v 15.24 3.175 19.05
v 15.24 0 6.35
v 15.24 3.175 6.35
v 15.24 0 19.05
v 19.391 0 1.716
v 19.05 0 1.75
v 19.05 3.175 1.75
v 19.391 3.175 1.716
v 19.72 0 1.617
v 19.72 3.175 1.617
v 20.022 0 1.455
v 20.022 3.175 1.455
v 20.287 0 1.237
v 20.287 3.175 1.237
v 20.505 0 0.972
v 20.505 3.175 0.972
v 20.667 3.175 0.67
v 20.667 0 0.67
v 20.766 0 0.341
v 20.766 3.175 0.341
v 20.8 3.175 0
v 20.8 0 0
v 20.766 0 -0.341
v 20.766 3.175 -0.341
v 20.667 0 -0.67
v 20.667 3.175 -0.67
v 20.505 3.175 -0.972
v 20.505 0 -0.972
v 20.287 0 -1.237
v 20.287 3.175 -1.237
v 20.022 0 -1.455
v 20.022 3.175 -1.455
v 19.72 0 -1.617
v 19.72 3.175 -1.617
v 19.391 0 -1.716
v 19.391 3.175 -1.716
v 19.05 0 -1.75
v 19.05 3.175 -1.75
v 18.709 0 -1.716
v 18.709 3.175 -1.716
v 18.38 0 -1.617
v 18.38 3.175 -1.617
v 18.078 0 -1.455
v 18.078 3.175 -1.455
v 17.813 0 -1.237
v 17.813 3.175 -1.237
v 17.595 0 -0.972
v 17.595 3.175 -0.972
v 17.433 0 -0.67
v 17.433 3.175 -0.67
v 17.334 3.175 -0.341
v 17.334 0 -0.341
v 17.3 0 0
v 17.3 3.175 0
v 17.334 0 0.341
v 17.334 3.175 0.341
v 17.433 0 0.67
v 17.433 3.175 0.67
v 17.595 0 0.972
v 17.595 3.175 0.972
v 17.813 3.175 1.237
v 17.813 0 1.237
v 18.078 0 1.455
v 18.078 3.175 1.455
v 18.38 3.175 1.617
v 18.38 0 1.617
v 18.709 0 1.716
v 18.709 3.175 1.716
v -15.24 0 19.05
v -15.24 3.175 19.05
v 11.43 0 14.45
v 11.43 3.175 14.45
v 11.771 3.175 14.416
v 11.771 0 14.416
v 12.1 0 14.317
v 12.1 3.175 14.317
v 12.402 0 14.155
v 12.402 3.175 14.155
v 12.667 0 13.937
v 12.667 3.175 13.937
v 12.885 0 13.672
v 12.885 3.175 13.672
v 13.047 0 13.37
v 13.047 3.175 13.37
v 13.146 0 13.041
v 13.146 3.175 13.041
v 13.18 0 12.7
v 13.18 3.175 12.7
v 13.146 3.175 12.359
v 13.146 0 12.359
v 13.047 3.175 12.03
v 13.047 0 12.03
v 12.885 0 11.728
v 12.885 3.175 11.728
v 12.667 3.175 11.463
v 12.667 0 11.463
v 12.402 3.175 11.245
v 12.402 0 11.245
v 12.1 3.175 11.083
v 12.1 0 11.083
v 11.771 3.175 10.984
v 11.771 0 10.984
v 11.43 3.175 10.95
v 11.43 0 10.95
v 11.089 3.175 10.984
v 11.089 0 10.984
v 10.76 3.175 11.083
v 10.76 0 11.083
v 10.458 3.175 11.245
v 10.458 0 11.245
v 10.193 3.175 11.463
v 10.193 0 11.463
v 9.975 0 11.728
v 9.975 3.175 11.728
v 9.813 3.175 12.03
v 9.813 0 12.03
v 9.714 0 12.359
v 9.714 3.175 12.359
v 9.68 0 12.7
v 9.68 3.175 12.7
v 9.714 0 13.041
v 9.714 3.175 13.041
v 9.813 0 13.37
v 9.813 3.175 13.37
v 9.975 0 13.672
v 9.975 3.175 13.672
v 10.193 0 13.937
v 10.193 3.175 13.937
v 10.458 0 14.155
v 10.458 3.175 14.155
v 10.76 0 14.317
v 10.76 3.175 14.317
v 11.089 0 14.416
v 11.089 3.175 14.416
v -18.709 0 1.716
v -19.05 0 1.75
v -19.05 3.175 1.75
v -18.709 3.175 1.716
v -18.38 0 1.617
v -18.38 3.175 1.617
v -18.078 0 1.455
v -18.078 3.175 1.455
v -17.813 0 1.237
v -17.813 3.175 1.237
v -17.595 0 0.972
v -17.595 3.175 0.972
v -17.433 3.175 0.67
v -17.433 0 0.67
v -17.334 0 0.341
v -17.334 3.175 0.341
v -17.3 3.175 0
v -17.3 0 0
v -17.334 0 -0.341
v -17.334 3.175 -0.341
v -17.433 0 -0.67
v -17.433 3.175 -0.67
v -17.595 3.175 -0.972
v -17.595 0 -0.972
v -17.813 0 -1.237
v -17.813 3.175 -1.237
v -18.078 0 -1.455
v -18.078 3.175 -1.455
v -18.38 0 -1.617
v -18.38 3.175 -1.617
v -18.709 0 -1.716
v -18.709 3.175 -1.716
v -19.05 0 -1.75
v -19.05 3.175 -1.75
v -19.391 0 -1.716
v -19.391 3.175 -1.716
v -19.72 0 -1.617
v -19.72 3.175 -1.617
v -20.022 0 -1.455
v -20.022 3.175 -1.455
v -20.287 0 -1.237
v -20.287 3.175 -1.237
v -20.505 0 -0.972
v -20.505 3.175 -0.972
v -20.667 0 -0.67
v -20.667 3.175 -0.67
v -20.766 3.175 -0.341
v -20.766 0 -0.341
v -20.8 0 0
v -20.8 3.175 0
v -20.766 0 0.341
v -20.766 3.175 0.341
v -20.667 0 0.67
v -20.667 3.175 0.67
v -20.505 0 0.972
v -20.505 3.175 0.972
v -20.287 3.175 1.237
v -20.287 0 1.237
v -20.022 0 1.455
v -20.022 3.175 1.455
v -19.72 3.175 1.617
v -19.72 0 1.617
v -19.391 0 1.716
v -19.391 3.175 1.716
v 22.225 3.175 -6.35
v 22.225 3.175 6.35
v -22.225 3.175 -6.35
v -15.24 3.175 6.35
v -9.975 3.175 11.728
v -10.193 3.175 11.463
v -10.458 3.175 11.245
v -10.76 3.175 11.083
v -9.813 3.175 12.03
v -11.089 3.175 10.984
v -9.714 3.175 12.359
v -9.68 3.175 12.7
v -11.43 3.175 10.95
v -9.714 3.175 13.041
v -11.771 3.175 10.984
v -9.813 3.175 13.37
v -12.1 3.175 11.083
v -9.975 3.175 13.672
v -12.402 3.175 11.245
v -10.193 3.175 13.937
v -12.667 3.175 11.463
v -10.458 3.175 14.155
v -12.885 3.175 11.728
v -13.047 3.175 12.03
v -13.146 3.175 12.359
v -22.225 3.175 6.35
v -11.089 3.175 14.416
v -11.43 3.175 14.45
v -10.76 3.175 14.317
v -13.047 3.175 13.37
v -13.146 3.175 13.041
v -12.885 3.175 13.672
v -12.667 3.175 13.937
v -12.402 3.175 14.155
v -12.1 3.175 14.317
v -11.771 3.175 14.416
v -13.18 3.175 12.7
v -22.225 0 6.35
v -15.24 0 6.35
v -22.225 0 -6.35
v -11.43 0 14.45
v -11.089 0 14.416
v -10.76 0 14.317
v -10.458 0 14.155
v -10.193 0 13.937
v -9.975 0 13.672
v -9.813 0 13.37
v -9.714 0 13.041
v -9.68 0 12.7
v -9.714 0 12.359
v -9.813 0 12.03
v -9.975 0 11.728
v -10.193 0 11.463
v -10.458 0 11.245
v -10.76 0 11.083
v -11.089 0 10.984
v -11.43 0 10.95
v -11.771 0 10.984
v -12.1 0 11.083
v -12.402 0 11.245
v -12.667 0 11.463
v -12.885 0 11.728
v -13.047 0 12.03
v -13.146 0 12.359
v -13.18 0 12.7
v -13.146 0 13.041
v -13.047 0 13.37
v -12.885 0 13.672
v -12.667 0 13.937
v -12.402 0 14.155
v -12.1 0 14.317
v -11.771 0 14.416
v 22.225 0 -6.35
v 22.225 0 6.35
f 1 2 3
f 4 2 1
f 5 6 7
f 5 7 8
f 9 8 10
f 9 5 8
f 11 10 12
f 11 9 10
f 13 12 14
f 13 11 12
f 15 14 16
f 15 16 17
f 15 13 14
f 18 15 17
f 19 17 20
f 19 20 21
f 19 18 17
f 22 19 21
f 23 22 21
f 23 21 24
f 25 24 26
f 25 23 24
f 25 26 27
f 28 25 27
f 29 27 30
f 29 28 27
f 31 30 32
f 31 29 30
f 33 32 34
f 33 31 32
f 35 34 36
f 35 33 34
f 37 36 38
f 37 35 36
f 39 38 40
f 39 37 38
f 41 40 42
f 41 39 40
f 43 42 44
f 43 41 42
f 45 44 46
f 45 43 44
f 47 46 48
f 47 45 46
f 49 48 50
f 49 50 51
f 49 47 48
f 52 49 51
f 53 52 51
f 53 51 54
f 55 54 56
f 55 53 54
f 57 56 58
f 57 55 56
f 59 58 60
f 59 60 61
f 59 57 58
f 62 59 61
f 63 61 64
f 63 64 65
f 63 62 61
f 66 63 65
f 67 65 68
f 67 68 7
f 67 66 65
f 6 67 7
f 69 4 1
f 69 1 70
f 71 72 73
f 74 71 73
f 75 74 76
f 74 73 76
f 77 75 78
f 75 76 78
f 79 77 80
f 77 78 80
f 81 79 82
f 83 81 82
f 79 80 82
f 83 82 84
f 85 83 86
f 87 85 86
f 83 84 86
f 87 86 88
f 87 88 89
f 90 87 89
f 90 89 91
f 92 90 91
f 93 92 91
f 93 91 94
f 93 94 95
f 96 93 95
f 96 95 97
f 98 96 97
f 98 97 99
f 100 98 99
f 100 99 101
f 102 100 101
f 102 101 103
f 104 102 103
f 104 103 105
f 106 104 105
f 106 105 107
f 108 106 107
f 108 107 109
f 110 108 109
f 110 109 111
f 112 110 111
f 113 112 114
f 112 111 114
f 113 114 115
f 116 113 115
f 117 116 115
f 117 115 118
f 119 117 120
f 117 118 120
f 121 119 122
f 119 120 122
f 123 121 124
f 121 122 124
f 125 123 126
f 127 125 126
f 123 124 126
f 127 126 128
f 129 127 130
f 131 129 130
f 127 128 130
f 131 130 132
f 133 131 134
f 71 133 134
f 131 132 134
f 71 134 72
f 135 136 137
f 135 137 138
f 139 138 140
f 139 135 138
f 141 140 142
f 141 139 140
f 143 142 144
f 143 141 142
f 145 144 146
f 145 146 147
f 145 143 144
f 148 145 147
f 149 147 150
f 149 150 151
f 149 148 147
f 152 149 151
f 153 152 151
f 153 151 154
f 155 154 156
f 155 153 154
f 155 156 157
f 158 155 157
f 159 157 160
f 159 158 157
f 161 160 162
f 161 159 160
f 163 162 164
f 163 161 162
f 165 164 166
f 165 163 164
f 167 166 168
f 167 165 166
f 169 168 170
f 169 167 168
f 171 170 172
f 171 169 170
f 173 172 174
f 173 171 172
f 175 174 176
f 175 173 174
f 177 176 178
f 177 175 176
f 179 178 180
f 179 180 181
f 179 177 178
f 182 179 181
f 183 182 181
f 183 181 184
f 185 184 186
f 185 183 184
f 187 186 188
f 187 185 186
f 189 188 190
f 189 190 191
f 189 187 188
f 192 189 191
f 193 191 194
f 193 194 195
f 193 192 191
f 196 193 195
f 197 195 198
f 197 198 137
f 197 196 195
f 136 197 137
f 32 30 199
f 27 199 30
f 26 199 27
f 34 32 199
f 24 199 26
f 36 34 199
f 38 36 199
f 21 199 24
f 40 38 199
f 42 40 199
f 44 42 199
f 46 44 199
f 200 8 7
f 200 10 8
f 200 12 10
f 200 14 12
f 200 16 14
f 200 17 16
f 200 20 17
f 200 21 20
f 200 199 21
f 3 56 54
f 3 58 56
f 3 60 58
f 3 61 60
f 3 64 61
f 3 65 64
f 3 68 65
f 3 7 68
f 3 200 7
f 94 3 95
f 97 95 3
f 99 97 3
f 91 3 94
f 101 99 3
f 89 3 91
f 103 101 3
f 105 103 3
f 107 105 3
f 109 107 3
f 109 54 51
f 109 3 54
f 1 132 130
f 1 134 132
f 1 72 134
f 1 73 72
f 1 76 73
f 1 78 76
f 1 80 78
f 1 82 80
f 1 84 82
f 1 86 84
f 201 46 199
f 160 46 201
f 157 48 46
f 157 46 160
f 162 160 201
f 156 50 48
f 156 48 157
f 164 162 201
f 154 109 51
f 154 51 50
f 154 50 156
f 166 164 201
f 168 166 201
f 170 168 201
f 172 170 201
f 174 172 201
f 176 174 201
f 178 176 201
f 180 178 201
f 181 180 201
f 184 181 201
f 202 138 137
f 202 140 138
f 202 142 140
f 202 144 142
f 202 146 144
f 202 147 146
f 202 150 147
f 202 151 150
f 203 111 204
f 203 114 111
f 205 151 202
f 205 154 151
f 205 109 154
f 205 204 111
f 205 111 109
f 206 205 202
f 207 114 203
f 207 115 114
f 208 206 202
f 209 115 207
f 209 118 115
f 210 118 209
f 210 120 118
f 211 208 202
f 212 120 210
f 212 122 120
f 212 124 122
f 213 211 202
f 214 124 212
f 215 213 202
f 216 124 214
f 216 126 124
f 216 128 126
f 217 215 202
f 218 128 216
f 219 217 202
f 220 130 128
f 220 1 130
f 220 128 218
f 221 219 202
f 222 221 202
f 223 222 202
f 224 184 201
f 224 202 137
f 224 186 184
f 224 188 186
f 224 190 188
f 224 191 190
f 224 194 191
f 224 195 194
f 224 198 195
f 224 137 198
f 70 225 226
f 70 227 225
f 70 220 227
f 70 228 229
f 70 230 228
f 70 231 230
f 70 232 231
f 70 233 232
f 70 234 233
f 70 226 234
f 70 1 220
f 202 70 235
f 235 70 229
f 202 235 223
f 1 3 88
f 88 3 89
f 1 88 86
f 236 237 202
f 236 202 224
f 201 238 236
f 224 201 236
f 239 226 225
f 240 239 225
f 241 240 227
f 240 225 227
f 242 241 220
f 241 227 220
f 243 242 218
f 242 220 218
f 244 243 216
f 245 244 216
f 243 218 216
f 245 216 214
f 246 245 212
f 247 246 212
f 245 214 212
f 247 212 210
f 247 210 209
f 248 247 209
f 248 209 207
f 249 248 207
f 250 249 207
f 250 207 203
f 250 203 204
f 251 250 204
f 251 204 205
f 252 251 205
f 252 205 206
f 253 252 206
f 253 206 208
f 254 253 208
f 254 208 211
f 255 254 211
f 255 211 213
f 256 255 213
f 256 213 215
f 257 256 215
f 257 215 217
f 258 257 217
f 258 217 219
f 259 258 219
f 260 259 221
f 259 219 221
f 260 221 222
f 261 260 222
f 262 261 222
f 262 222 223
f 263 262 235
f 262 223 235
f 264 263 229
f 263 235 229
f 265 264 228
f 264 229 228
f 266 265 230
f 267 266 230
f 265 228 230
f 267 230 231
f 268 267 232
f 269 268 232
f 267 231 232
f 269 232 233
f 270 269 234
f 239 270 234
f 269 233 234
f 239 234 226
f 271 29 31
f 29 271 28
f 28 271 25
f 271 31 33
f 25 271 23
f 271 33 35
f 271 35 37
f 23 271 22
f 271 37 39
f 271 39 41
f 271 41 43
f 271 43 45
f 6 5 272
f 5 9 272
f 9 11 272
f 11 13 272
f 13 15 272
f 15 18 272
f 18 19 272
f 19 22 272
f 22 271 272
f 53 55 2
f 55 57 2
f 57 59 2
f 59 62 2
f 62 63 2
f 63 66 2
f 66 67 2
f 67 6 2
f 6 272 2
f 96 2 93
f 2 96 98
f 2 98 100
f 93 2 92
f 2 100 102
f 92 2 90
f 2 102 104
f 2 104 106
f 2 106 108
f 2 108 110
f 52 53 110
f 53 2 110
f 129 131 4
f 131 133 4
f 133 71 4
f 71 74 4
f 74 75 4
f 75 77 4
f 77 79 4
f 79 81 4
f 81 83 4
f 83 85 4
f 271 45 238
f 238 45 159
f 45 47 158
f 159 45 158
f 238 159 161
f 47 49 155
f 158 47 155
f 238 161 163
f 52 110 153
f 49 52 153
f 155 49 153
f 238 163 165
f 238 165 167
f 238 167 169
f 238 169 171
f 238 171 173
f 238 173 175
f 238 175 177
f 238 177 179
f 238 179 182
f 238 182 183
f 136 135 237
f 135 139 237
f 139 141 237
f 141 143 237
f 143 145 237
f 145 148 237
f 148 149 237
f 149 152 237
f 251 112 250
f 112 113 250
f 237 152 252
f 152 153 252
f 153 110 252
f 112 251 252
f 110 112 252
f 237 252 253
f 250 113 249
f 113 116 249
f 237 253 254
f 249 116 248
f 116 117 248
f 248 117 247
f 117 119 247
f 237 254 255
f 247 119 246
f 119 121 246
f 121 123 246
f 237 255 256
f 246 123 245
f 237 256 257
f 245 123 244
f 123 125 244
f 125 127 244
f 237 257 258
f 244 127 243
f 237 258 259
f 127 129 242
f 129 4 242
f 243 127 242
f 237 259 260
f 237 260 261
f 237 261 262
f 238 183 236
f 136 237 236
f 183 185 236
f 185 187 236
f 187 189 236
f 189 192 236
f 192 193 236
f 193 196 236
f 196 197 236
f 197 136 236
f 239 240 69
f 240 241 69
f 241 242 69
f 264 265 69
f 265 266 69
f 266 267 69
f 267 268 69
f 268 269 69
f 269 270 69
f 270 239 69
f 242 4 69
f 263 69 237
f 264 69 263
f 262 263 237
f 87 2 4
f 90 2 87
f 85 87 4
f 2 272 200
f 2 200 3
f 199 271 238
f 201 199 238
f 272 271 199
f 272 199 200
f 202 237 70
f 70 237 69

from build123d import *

# Parameters (mm, degrees)
SKETCH1_W           = 44.45
SKETCH1_H           = 12.7
SKETCH1_R           = 1.75
SKETCH1_W_2         = 30.48
BOSS_EXTRUDE1_DEPTH = 3.175
SKETCH2_R           = 1.75
CUT_EXTRUDE1_DEPTH  = 12.192


with BuildPart() as part:
    # Sketch1 → Boss-Extrude1 (new body)
    # profile 1 of 2: a face of its own
    with BuildSketch(Plane(origin=(0, 0, 0), x_dir=(-1, 0, 0), z_dir=(0, 1, 0))):
        Rectangle(SKETCH1_W, SKETCH1_H)
        with Locations(Location((19.05, 0, 0), (0, 0, 90))):
            Circle(SKETCH1_R, mode=Mode.SUBTRACT)
        with Locations(Location((-19.05, 0, 0), (0, 0, 90))):
            Circle(SKETCH1_R, mode=Mode.SUBTRACT)
    # profile 2 of 2: a face of its own
    with BuildSketch(Plane(origin=(0, 0, 0), x_dir=(-1, 0, 0), z_dir=(0, 1, 0))):
        with Locations((0, 12.7)):
            Rectangle(SKETCH1_W_2, SKETCH1_H)
    extrude(amount=BOSS_EXTRUDE1_DEPTH)

    # Sketch2 → Cut-Extrude1 (cut)
    with BuildSketch(Plane(origin=(0, 3.175, 0), x_dir=(-1, 0, 0), z_dir=(0, 1, 0))):
        with Locations(Location((-11.43, 12.7, 0), (0, 0, 90))):
            Circle(SKETCH2_R)
        with Locations(Location((11.43, 12.7, 0), (0, 0, 90))):
            Circle(SKETCH2_R)
    extrude(amount=-CUT_EXTRUDE1_DEPTH, mode=Mode.SUBTRACT)


solid = part.part
